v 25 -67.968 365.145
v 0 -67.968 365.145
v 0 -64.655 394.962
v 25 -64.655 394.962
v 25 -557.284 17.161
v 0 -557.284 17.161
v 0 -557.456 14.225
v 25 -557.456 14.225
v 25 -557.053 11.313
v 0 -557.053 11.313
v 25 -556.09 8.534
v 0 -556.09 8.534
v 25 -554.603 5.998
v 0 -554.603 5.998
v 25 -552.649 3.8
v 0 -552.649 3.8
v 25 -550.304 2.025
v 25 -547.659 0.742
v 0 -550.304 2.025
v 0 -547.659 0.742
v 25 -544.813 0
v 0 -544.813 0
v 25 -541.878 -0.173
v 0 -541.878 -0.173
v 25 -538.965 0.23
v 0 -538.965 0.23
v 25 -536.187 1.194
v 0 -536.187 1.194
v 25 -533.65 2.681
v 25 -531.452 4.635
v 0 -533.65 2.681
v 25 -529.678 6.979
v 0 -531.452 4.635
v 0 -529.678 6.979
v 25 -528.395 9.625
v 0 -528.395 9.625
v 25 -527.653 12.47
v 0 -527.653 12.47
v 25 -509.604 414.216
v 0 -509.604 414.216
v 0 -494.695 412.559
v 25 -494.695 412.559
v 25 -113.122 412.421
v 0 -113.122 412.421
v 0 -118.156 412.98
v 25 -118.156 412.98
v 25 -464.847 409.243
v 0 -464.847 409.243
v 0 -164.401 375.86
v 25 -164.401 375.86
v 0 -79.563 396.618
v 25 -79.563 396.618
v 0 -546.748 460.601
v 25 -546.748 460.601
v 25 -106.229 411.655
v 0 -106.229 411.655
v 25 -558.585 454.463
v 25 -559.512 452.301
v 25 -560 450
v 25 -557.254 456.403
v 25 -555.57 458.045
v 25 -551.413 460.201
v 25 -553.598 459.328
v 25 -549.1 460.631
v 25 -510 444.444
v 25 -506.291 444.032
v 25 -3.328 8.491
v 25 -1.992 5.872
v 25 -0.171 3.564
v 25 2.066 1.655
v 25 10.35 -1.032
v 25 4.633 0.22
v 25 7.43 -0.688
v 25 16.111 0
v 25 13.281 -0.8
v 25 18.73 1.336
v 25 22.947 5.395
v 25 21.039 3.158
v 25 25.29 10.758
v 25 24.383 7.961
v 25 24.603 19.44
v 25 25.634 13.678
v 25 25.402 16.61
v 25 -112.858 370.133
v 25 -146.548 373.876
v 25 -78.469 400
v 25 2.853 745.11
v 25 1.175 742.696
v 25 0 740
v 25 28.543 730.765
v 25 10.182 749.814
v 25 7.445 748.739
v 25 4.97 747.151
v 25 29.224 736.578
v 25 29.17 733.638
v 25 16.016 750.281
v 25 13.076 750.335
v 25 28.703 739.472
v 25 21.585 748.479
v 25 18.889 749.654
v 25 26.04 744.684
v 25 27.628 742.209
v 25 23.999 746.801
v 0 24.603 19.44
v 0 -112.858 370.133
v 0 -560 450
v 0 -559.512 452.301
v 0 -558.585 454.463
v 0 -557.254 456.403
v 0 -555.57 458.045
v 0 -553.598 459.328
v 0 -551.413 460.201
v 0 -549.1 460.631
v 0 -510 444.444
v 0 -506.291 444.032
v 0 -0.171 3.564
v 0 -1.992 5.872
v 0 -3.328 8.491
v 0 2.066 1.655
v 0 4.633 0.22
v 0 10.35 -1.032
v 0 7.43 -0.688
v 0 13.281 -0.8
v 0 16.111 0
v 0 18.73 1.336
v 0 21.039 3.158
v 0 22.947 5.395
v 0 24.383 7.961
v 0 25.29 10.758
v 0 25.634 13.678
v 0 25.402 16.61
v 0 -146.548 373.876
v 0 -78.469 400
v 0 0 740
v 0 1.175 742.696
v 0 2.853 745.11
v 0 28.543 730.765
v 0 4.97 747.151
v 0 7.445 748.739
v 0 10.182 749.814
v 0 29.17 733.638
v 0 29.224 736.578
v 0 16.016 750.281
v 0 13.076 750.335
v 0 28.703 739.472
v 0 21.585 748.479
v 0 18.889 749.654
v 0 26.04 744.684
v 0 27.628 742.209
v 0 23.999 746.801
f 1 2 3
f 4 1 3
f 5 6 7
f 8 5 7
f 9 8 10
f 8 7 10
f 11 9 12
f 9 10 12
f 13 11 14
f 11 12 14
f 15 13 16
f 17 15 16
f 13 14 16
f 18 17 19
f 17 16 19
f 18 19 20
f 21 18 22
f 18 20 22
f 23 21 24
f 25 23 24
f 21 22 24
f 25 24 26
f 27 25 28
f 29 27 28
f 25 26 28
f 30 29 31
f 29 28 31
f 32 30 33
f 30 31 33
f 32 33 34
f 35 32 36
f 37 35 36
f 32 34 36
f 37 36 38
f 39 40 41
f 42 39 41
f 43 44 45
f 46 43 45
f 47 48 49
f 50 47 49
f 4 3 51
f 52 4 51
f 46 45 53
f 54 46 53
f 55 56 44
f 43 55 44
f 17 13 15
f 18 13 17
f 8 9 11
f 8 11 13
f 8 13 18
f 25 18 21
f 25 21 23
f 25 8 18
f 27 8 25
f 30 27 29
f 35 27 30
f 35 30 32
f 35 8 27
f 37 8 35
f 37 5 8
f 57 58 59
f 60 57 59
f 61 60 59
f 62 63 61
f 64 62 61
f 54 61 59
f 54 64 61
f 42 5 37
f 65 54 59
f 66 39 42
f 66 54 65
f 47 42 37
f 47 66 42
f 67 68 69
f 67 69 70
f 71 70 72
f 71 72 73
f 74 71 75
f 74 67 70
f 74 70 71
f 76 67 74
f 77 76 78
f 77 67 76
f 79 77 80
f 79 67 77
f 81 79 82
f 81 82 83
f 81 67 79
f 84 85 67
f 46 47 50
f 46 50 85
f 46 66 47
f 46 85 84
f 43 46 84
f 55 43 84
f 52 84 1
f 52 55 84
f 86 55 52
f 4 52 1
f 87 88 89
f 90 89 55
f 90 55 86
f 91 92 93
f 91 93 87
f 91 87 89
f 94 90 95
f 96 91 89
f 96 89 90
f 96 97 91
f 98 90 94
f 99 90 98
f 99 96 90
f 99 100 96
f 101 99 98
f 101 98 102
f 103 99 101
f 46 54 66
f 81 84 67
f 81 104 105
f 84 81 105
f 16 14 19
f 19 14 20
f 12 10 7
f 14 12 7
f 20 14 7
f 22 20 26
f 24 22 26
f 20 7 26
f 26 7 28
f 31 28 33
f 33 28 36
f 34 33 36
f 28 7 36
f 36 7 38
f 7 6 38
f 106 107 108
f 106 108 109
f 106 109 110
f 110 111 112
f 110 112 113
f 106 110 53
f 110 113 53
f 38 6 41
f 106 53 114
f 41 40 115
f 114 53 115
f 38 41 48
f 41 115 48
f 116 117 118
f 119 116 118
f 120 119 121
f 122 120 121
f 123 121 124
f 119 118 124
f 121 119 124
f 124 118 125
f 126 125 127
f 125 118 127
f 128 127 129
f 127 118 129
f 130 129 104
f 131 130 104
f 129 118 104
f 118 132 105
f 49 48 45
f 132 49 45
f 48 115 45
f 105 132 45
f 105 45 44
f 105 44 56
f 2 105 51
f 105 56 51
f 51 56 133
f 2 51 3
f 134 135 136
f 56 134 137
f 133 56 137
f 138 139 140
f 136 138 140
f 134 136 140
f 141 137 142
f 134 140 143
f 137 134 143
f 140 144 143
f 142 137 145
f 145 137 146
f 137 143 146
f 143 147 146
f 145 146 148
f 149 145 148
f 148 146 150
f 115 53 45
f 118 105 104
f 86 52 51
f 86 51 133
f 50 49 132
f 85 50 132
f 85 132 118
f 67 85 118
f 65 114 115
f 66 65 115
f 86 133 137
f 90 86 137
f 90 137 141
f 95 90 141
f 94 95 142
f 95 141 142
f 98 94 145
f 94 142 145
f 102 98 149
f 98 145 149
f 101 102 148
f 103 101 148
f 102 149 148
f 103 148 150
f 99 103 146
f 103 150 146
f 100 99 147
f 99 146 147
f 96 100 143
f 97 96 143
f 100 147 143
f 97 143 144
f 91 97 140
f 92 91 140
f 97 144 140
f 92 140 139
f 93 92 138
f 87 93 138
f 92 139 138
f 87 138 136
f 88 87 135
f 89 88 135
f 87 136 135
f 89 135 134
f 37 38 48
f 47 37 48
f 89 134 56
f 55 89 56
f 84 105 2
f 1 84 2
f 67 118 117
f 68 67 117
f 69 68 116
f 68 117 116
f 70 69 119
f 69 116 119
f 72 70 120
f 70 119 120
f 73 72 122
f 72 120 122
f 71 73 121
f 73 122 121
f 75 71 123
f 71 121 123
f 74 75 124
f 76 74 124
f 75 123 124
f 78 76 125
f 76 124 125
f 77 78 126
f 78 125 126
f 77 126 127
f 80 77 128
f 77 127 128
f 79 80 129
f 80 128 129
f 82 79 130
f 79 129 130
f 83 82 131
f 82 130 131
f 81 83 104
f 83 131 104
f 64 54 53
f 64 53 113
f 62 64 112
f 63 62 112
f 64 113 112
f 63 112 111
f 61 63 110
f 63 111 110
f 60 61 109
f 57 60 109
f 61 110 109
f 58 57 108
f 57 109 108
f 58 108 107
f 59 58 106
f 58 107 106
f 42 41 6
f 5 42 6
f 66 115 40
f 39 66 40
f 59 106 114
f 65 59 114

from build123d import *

# Parameters (mm, degrees)
F1_DEPTH = 25


with BuildPart() as f1:
    # F0 (on Right) → F1 (new body)
    with BuildSketch(Plane.YZ):
        with BuildLine():
            Line((24.602603, 19.439522), (-112.858058, 370.132945))
            Line((-112.858058, 370.132945), (-113.312946, 370.183488))
            Line((-113.312946, 370.183488), (-117.698107, 370.670728))
            Line((-117.698107, 370.670728), (-146.547582, 373.876225))
            Line((-146.547582, 373.876225), (-3.328384, 8.491464))
            ThreePointArc((-3.328384, 8.491464), (16.111139, 0), (24.602603, 19.439522))
        make_face()
        with BuildLine():
            Line((-527.65253, 12.470365), (-464.846842, 409.24281))
            Line((-464.846842, 409.24281), (-494.695385, 412.559315))
            Line((-494.695385, 412.559315), (-557.283606, 17.160711))
            ThreePointArc((-557.283606, 17.160711), (-544.813241, 0), (-527.65253, 12.470365))
        make_face()
        with BuildLine():
            ThreePointArc((28.543336, 730.765391), (18.888972, 749.654363), (0, 740))
            Line((0, 740), (-106.229303, 411.654881))
            ThreePointArc((-106.229303, 411.654881), (-106.738574, 409.286215), (-107.713254, 407.068124))
            Line((-107.713254, 407.068124), (-110, 400))
            Line((-110, 400), (-79.563133, 396.618126))
            Line((-79.563133, 396.618126), (-78.468997, 400))
            Line((-78.468997, 400), (28.543336, 730.765391))
        make_face()
        Polygon((-164.400516, 375.859885), (-161.087571, 405.676397), (-506.290695, 444.032299), (-509.603641, 414.215787), (-494.695385, 412.559315), (-464.846842, 409.24281), align=None)
        with BuildLine():
            Line((-107.713254, 407.068124), (-106.229303, 411.654881))
            Line((-106.229303, 411.654881), (-113.12206, 412.420742))
            Line((-113.12206, 412.420742), (-118.155908, 412.980059))
            Line((-118.155908, 412.980059), (-546.748217, 460.601427))
            ThreePointArc((-546.748217, 460.601427), (-555.569736, 458.045247), (-560, 450))
            Line((-560, 450), (-510, 444.444444))
            Line((-510, 444.444444), (-506.290695, 444.032299))
            Line((-506.290695, 444.032299), (-161.087571, 405.676397))
            Line((-161.087571, 405.676397), (-121.926605, 401.325178))
            Line((-121.926605, 401.325178), (-119.481086, 401.053454))
            ThreePointArc((-119.481086, 401.053454), (-112.694575, 402.294843), (-107.713254, 407.068124))
        make_face()
        Polygon((-79.563133, 396.618126), (-110, 400), (-119.481086, 401.053454), (-121.926605, 401.325178), (-161.087571, 405.676397), (-164.400516, 375.859885), (-146.547582, 373.876225), (-117.698107, 370.670728), (-113.312946, 370.183488), (-112.858058, 370.132945), (-67.967822, 365.145141), (-64.654877, 394.961653), align=None)
        with BuildLine():
            ThreePointArc((-107.713254, 407.068124), (-106.738574, 409.286215), (-106.229303, 411.654881))
            Line((-106.229303, 411.654881), (-107.713254, 407.068124))
        make_face()
        with BuildLine():
            Line((-110, 400), (-107.713254, 407.068124))
            ThreePointArc((-107.713254, 407.068124), (-112.694575, 402.294843), (-119.481086, 401.053454))
            Line((-119.481086, 401.053454), (-110, 400))
        make_face()
    extrude(amount=F1_DEPTH)


solid = f1.part
